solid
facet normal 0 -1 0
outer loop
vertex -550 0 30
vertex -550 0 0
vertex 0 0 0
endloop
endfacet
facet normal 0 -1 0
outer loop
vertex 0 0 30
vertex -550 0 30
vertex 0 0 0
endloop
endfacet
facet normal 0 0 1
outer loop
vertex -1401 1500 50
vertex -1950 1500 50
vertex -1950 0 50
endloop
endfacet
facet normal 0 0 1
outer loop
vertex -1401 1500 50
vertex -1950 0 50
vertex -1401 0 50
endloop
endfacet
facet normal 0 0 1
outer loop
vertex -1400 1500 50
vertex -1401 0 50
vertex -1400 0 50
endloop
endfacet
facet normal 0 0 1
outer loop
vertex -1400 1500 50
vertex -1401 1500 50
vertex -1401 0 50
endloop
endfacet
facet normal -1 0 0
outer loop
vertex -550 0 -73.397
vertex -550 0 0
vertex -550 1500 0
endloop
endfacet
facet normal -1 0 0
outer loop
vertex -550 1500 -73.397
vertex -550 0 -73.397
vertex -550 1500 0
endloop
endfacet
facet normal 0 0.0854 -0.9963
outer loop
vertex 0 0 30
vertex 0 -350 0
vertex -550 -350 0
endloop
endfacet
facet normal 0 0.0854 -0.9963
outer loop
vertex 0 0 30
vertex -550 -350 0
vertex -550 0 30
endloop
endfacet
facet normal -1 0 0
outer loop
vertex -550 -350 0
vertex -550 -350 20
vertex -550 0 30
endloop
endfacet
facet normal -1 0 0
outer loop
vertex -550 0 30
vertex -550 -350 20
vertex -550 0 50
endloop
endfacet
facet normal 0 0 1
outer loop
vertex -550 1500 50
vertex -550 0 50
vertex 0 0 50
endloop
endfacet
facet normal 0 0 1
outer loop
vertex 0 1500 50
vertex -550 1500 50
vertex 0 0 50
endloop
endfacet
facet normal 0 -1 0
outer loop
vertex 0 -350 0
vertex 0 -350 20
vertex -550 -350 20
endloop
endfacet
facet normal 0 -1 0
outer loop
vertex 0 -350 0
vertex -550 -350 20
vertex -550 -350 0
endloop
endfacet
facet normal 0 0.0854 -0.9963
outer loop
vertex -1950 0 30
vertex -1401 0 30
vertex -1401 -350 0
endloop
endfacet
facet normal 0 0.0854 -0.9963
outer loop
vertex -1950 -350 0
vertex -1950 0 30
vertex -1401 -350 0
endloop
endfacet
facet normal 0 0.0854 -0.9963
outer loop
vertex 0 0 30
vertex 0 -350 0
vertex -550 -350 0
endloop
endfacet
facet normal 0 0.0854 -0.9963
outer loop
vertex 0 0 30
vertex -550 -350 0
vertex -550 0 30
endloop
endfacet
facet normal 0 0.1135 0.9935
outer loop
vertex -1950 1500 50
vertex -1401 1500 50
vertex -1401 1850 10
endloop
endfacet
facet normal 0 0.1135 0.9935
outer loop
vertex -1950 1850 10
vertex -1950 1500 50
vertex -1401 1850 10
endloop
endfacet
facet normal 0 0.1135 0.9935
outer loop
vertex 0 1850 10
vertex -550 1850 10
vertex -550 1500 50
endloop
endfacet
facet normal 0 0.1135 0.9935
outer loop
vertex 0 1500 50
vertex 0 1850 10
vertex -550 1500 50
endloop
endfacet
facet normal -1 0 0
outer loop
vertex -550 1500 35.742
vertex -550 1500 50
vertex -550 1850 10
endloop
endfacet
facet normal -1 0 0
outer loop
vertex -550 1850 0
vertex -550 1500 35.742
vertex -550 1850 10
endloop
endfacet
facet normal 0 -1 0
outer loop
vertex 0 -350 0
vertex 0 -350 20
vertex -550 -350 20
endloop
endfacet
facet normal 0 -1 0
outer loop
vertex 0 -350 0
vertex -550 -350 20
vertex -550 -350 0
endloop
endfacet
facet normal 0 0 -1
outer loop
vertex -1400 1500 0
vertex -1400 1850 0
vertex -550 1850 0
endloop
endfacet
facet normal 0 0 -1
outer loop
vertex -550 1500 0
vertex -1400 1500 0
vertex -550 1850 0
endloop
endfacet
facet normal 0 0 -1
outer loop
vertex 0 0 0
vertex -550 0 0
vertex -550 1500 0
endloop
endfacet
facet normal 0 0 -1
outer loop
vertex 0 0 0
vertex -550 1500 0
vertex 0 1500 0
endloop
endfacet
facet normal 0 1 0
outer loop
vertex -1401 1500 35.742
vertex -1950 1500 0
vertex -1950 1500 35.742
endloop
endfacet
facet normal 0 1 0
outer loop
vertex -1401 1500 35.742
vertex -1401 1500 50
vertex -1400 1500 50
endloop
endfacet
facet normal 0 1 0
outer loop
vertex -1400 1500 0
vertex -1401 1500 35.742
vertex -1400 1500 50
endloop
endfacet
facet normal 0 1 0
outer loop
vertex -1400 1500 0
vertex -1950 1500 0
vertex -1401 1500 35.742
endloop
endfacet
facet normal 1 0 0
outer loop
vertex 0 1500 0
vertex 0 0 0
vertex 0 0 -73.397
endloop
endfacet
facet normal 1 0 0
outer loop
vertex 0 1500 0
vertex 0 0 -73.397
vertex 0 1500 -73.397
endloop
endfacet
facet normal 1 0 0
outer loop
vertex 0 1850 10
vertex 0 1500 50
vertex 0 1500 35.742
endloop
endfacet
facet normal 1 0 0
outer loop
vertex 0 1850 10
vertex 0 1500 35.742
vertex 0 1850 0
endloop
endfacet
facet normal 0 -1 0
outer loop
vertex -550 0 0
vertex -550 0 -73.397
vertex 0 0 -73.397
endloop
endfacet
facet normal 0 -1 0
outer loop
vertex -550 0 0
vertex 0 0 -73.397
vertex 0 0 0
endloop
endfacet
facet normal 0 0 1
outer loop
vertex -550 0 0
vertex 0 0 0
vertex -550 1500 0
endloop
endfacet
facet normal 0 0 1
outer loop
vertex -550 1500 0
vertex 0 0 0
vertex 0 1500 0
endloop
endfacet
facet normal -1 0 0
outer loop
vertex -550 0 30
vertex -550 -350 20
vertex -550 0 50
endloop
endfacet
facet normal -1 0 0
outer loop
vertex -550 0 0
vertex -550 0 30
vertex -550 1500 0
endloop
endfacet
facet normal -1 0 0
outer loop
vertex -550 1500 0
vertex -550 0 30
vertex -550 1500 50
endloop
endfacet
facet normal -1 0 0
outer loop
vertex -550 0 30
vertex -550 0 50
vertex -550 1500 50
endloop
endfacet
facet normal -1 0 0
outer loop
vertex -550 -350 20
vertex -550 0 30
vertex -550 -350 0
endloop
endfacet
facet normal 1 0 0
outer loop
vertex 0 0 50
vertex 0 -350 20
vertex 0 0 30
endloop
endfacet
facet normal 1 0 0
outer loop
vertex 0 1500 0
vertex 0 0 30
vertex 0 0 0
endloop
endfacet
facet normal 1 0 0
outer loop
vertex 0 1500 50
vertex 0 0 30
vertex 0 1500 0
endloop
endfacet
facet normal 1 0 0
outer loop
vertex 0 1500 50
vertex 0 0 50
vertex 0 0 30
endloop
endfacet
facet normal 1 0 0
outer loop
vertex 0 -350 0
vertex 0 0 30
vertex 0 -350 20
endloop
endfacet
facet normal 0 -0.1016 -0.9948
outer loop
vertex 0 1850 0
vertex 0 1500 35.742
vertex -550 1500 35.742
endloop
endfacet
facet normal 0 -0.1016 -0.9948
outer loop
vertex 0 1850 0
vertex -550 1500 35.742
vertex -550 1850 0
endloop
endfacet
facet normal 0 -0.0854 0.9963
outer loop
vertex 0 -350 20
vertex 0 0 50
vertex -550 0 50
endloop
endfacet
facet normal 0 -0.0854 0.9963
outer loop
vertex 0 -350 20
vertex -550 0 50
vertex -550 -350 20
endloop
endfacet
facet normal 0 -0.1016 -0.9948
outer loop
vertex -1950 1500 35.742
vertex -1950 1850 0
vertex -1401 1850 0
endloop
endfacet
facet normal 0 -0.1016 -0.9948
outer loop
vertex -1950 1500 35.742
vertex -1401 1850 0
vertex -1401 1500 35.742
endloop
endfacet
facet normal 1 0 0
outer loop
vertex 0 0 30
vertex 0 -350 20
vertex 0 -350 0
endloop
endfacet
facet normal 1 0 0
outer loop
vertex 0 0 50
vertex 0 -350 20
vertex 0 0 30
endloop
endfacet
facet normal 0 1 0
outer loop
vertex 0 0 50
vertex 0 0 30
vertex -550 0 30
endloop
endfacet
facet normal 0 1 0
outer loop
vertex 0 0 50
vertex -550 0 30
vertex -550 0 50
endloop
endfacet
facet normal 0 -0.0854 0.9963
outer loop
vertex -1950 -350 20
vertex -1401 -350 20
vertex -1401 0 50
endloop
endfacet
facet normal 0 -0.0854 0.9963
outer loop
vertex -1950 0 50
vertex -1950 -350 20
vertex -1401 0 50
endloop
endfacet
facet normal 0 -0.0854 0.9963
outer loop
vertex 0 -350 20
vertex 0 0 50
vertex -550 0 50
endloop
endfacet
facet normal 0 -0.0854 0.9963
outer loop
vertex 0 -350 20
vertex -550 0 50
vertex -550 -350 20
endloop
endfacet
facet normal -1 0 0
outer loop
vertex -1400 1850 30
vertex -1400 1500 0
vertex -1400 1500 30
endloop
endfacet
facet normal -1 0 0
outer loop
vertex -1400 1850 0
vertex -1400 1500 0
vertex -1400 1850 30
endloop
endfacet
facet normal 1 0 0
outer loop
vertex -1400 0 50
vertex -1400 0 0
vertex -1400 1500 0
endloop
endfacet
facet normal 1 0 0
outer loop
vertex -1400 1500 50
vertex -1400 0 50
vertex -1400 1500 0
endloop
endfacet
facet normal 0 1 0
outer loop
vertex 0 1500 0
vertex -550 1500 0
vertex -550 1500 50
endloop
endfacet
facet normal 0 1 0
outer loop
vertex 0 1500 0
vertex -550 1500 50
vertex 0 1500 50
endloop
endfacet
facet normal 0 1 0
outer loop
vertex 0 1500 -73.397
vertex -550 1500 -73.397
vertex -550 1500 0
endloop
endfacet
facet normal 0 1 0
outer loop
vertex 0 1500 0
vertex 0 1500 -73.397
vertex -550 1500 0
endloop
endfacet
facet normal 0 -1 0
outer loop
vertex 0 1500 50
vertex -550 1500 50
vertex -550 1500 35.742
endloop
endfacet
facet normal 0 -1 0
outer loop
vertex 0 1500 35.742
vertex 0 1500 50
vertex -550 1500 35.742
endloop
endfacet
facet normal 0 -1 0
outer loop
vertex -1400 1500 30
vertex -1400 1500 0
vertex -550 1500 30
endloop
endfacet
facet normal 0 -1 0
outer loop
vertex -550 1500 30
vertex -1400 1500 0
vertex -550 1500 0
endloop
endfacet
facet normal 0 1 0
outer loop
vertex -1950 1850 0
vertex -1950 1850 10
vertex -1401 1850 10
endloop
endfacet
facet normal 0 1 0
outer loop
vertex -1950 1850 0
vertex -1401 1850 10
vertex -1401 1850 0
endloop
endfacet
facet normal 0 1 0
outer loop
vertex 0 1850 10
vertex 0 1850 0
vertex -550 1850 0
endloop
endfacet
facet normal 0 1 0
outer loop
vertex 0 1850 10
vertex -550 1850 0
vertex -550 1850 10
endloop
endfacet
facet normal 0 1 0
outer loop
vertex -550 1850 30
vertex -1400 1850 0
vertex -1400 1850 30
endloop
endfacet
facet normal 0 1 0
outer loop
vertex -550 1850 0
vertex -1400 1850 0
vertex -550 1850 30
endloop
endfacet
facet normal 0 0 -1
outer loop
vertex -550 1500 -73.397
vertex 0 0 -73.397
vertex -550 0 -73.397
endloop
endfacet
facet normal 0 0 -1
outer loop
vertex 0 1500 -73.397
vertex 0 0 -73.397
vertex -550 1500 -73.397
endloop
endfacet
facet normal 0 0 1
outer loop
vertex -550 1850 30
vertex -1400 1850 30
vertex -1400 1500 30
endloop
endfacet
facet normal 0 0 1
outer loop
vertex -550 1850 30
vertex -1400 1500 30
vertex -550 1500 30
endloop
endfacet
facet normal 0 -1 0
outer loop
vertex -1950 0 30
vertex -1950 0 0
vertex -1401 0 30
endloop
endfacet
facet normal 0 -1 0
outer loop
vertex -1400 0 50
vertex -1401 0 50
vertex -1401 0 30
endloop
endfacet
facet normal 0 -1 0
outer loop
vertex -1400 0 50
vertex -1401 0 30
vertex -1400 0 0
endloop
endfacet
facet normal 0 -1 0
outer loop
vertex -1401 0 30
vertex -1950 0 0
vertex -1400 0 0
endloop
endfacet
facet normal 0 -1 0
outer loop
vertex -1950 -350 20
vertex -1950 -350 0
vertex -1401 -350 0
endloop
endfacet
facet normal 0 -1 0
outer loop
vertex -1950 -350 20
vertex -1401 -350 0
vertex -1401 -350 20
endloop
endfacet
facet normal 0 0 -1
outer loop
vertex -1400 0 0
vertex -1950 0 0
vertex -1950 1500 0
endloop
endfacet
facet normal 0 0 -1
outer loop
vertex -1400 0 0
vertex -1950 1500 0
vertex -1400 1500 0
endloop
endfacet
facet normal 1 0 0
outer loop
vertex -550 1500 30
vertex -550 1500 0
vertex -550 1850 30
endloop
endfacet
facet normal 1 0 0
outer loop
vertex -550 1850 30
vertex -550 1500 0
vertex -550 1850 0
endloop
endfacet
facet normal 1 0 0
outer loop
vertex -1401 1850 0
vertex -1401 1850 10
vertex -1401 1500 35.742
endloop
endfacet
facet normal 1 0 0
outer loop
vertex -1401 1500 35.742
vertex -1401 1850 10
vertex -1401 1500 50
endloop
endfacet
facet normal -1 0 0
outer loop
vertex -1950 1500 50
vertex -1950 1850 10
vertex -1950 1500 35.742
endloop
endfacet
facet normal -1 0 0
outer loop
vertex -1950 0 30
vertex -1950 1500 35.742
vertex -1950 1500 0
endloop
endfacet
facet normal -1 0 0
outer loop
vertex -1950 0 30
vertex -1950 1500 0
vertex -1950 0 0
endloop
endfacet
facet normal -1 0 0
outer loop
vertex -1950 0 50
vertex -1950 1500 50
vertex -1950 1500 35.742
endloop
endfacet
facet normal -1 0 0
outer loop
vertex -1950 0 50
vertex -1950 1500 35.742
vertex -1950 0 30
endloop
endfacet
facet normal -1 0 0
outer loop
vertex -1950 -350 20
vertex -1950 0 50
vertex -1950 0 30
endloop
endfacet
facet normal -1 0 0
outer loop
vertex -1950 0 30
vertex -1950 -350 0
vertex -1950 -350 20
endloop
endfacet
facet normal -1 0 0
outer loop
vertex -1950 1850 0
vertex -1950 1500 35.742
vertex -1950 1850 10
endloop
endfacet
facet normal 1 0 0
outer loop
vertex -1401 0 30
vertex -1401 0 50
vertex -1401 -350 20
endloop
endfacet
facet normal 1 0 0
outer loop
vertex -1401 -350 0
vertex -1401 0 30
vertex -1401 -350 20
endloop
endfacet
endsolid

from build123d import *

# Parameters (mm, degrees)
F0_W     = 550
F0_H     = 1500
F1_DEPTH = 50
F0_W_2   = 850
F0_H_2   = 350
F2_DEPTH = 30
F4_DEPTH = 550
F3_W     = 1500
F3_H     = 73.396802
F5_DEPTH = 550
F6_DEPTH = 550
F8_DEPTH = 549


with BuildPart() as f1:
    # F0 (on Top) → F1 (new body)
    with BuildSketch(Plane.XY):
        with Locations((-1675, 750)):
            Rectangle(F0_W, F0_H)
        with Locations((-275, 750)):
            Rectangle(F0_W, F0_H)
    extrude(amount=F1_DEPTH)

    # F3 (on face) → F4 (join)
    with BuildSketch(Plane.YZ):
        Polygon((-350, 20), (-350, 0), (0, 30), (0, 50), align=None)
    extrude(amount=-F4_DEPTH)

    # F7 (on face) → F8 (join)
    with BuildSketch(Plane(origin=(-1950, 0, 0), x_dir=(0, -1, 0), z_dir=(-1, 0, 0))):
        Polygon((0, 50), (0, 30), (350, 0), (350, 20), align=None)
        Polygon((-1850, 0), (-1500, 35.742112), (-1500, 50), (-1850, 10), align=None)
    extrude(amount=-F8_DEPTH)


with BuildPart() as f2:
    # F0 (on Top) → F2 (new body)
    with BuildSketch(Plane.XY):
        with Locations((-975, 1675)):
            Rectangle(F0_W_2, F0_H_2)
    extrude(amount=F2_DEPTH)


with BuildPart() as f5:
    # F3 (on face) → F5 (new body)
    with BuildSketch(Plane.YZ):
        Polygon((-350, 20), (-350, 0), (0, 30), (0, 50), align=None)
        with Locations((750, -36.698401)):
            Rectangle(F3_W, F3_H)
    extrude(amount=-F5_DEPTH)


with BuildPart() as f6:
    # F3 (on face) → F6 (new body)
    with BuildSketch(Plane.YZ):
        Polygon((1500, 50), (1500, 35.742112), (1850, 0), (1850, 10), align=None)
    extrude(amount=-F6_DEPTH)


solid = Compound([f1.part, f2.part, f5.part, f6.part])
